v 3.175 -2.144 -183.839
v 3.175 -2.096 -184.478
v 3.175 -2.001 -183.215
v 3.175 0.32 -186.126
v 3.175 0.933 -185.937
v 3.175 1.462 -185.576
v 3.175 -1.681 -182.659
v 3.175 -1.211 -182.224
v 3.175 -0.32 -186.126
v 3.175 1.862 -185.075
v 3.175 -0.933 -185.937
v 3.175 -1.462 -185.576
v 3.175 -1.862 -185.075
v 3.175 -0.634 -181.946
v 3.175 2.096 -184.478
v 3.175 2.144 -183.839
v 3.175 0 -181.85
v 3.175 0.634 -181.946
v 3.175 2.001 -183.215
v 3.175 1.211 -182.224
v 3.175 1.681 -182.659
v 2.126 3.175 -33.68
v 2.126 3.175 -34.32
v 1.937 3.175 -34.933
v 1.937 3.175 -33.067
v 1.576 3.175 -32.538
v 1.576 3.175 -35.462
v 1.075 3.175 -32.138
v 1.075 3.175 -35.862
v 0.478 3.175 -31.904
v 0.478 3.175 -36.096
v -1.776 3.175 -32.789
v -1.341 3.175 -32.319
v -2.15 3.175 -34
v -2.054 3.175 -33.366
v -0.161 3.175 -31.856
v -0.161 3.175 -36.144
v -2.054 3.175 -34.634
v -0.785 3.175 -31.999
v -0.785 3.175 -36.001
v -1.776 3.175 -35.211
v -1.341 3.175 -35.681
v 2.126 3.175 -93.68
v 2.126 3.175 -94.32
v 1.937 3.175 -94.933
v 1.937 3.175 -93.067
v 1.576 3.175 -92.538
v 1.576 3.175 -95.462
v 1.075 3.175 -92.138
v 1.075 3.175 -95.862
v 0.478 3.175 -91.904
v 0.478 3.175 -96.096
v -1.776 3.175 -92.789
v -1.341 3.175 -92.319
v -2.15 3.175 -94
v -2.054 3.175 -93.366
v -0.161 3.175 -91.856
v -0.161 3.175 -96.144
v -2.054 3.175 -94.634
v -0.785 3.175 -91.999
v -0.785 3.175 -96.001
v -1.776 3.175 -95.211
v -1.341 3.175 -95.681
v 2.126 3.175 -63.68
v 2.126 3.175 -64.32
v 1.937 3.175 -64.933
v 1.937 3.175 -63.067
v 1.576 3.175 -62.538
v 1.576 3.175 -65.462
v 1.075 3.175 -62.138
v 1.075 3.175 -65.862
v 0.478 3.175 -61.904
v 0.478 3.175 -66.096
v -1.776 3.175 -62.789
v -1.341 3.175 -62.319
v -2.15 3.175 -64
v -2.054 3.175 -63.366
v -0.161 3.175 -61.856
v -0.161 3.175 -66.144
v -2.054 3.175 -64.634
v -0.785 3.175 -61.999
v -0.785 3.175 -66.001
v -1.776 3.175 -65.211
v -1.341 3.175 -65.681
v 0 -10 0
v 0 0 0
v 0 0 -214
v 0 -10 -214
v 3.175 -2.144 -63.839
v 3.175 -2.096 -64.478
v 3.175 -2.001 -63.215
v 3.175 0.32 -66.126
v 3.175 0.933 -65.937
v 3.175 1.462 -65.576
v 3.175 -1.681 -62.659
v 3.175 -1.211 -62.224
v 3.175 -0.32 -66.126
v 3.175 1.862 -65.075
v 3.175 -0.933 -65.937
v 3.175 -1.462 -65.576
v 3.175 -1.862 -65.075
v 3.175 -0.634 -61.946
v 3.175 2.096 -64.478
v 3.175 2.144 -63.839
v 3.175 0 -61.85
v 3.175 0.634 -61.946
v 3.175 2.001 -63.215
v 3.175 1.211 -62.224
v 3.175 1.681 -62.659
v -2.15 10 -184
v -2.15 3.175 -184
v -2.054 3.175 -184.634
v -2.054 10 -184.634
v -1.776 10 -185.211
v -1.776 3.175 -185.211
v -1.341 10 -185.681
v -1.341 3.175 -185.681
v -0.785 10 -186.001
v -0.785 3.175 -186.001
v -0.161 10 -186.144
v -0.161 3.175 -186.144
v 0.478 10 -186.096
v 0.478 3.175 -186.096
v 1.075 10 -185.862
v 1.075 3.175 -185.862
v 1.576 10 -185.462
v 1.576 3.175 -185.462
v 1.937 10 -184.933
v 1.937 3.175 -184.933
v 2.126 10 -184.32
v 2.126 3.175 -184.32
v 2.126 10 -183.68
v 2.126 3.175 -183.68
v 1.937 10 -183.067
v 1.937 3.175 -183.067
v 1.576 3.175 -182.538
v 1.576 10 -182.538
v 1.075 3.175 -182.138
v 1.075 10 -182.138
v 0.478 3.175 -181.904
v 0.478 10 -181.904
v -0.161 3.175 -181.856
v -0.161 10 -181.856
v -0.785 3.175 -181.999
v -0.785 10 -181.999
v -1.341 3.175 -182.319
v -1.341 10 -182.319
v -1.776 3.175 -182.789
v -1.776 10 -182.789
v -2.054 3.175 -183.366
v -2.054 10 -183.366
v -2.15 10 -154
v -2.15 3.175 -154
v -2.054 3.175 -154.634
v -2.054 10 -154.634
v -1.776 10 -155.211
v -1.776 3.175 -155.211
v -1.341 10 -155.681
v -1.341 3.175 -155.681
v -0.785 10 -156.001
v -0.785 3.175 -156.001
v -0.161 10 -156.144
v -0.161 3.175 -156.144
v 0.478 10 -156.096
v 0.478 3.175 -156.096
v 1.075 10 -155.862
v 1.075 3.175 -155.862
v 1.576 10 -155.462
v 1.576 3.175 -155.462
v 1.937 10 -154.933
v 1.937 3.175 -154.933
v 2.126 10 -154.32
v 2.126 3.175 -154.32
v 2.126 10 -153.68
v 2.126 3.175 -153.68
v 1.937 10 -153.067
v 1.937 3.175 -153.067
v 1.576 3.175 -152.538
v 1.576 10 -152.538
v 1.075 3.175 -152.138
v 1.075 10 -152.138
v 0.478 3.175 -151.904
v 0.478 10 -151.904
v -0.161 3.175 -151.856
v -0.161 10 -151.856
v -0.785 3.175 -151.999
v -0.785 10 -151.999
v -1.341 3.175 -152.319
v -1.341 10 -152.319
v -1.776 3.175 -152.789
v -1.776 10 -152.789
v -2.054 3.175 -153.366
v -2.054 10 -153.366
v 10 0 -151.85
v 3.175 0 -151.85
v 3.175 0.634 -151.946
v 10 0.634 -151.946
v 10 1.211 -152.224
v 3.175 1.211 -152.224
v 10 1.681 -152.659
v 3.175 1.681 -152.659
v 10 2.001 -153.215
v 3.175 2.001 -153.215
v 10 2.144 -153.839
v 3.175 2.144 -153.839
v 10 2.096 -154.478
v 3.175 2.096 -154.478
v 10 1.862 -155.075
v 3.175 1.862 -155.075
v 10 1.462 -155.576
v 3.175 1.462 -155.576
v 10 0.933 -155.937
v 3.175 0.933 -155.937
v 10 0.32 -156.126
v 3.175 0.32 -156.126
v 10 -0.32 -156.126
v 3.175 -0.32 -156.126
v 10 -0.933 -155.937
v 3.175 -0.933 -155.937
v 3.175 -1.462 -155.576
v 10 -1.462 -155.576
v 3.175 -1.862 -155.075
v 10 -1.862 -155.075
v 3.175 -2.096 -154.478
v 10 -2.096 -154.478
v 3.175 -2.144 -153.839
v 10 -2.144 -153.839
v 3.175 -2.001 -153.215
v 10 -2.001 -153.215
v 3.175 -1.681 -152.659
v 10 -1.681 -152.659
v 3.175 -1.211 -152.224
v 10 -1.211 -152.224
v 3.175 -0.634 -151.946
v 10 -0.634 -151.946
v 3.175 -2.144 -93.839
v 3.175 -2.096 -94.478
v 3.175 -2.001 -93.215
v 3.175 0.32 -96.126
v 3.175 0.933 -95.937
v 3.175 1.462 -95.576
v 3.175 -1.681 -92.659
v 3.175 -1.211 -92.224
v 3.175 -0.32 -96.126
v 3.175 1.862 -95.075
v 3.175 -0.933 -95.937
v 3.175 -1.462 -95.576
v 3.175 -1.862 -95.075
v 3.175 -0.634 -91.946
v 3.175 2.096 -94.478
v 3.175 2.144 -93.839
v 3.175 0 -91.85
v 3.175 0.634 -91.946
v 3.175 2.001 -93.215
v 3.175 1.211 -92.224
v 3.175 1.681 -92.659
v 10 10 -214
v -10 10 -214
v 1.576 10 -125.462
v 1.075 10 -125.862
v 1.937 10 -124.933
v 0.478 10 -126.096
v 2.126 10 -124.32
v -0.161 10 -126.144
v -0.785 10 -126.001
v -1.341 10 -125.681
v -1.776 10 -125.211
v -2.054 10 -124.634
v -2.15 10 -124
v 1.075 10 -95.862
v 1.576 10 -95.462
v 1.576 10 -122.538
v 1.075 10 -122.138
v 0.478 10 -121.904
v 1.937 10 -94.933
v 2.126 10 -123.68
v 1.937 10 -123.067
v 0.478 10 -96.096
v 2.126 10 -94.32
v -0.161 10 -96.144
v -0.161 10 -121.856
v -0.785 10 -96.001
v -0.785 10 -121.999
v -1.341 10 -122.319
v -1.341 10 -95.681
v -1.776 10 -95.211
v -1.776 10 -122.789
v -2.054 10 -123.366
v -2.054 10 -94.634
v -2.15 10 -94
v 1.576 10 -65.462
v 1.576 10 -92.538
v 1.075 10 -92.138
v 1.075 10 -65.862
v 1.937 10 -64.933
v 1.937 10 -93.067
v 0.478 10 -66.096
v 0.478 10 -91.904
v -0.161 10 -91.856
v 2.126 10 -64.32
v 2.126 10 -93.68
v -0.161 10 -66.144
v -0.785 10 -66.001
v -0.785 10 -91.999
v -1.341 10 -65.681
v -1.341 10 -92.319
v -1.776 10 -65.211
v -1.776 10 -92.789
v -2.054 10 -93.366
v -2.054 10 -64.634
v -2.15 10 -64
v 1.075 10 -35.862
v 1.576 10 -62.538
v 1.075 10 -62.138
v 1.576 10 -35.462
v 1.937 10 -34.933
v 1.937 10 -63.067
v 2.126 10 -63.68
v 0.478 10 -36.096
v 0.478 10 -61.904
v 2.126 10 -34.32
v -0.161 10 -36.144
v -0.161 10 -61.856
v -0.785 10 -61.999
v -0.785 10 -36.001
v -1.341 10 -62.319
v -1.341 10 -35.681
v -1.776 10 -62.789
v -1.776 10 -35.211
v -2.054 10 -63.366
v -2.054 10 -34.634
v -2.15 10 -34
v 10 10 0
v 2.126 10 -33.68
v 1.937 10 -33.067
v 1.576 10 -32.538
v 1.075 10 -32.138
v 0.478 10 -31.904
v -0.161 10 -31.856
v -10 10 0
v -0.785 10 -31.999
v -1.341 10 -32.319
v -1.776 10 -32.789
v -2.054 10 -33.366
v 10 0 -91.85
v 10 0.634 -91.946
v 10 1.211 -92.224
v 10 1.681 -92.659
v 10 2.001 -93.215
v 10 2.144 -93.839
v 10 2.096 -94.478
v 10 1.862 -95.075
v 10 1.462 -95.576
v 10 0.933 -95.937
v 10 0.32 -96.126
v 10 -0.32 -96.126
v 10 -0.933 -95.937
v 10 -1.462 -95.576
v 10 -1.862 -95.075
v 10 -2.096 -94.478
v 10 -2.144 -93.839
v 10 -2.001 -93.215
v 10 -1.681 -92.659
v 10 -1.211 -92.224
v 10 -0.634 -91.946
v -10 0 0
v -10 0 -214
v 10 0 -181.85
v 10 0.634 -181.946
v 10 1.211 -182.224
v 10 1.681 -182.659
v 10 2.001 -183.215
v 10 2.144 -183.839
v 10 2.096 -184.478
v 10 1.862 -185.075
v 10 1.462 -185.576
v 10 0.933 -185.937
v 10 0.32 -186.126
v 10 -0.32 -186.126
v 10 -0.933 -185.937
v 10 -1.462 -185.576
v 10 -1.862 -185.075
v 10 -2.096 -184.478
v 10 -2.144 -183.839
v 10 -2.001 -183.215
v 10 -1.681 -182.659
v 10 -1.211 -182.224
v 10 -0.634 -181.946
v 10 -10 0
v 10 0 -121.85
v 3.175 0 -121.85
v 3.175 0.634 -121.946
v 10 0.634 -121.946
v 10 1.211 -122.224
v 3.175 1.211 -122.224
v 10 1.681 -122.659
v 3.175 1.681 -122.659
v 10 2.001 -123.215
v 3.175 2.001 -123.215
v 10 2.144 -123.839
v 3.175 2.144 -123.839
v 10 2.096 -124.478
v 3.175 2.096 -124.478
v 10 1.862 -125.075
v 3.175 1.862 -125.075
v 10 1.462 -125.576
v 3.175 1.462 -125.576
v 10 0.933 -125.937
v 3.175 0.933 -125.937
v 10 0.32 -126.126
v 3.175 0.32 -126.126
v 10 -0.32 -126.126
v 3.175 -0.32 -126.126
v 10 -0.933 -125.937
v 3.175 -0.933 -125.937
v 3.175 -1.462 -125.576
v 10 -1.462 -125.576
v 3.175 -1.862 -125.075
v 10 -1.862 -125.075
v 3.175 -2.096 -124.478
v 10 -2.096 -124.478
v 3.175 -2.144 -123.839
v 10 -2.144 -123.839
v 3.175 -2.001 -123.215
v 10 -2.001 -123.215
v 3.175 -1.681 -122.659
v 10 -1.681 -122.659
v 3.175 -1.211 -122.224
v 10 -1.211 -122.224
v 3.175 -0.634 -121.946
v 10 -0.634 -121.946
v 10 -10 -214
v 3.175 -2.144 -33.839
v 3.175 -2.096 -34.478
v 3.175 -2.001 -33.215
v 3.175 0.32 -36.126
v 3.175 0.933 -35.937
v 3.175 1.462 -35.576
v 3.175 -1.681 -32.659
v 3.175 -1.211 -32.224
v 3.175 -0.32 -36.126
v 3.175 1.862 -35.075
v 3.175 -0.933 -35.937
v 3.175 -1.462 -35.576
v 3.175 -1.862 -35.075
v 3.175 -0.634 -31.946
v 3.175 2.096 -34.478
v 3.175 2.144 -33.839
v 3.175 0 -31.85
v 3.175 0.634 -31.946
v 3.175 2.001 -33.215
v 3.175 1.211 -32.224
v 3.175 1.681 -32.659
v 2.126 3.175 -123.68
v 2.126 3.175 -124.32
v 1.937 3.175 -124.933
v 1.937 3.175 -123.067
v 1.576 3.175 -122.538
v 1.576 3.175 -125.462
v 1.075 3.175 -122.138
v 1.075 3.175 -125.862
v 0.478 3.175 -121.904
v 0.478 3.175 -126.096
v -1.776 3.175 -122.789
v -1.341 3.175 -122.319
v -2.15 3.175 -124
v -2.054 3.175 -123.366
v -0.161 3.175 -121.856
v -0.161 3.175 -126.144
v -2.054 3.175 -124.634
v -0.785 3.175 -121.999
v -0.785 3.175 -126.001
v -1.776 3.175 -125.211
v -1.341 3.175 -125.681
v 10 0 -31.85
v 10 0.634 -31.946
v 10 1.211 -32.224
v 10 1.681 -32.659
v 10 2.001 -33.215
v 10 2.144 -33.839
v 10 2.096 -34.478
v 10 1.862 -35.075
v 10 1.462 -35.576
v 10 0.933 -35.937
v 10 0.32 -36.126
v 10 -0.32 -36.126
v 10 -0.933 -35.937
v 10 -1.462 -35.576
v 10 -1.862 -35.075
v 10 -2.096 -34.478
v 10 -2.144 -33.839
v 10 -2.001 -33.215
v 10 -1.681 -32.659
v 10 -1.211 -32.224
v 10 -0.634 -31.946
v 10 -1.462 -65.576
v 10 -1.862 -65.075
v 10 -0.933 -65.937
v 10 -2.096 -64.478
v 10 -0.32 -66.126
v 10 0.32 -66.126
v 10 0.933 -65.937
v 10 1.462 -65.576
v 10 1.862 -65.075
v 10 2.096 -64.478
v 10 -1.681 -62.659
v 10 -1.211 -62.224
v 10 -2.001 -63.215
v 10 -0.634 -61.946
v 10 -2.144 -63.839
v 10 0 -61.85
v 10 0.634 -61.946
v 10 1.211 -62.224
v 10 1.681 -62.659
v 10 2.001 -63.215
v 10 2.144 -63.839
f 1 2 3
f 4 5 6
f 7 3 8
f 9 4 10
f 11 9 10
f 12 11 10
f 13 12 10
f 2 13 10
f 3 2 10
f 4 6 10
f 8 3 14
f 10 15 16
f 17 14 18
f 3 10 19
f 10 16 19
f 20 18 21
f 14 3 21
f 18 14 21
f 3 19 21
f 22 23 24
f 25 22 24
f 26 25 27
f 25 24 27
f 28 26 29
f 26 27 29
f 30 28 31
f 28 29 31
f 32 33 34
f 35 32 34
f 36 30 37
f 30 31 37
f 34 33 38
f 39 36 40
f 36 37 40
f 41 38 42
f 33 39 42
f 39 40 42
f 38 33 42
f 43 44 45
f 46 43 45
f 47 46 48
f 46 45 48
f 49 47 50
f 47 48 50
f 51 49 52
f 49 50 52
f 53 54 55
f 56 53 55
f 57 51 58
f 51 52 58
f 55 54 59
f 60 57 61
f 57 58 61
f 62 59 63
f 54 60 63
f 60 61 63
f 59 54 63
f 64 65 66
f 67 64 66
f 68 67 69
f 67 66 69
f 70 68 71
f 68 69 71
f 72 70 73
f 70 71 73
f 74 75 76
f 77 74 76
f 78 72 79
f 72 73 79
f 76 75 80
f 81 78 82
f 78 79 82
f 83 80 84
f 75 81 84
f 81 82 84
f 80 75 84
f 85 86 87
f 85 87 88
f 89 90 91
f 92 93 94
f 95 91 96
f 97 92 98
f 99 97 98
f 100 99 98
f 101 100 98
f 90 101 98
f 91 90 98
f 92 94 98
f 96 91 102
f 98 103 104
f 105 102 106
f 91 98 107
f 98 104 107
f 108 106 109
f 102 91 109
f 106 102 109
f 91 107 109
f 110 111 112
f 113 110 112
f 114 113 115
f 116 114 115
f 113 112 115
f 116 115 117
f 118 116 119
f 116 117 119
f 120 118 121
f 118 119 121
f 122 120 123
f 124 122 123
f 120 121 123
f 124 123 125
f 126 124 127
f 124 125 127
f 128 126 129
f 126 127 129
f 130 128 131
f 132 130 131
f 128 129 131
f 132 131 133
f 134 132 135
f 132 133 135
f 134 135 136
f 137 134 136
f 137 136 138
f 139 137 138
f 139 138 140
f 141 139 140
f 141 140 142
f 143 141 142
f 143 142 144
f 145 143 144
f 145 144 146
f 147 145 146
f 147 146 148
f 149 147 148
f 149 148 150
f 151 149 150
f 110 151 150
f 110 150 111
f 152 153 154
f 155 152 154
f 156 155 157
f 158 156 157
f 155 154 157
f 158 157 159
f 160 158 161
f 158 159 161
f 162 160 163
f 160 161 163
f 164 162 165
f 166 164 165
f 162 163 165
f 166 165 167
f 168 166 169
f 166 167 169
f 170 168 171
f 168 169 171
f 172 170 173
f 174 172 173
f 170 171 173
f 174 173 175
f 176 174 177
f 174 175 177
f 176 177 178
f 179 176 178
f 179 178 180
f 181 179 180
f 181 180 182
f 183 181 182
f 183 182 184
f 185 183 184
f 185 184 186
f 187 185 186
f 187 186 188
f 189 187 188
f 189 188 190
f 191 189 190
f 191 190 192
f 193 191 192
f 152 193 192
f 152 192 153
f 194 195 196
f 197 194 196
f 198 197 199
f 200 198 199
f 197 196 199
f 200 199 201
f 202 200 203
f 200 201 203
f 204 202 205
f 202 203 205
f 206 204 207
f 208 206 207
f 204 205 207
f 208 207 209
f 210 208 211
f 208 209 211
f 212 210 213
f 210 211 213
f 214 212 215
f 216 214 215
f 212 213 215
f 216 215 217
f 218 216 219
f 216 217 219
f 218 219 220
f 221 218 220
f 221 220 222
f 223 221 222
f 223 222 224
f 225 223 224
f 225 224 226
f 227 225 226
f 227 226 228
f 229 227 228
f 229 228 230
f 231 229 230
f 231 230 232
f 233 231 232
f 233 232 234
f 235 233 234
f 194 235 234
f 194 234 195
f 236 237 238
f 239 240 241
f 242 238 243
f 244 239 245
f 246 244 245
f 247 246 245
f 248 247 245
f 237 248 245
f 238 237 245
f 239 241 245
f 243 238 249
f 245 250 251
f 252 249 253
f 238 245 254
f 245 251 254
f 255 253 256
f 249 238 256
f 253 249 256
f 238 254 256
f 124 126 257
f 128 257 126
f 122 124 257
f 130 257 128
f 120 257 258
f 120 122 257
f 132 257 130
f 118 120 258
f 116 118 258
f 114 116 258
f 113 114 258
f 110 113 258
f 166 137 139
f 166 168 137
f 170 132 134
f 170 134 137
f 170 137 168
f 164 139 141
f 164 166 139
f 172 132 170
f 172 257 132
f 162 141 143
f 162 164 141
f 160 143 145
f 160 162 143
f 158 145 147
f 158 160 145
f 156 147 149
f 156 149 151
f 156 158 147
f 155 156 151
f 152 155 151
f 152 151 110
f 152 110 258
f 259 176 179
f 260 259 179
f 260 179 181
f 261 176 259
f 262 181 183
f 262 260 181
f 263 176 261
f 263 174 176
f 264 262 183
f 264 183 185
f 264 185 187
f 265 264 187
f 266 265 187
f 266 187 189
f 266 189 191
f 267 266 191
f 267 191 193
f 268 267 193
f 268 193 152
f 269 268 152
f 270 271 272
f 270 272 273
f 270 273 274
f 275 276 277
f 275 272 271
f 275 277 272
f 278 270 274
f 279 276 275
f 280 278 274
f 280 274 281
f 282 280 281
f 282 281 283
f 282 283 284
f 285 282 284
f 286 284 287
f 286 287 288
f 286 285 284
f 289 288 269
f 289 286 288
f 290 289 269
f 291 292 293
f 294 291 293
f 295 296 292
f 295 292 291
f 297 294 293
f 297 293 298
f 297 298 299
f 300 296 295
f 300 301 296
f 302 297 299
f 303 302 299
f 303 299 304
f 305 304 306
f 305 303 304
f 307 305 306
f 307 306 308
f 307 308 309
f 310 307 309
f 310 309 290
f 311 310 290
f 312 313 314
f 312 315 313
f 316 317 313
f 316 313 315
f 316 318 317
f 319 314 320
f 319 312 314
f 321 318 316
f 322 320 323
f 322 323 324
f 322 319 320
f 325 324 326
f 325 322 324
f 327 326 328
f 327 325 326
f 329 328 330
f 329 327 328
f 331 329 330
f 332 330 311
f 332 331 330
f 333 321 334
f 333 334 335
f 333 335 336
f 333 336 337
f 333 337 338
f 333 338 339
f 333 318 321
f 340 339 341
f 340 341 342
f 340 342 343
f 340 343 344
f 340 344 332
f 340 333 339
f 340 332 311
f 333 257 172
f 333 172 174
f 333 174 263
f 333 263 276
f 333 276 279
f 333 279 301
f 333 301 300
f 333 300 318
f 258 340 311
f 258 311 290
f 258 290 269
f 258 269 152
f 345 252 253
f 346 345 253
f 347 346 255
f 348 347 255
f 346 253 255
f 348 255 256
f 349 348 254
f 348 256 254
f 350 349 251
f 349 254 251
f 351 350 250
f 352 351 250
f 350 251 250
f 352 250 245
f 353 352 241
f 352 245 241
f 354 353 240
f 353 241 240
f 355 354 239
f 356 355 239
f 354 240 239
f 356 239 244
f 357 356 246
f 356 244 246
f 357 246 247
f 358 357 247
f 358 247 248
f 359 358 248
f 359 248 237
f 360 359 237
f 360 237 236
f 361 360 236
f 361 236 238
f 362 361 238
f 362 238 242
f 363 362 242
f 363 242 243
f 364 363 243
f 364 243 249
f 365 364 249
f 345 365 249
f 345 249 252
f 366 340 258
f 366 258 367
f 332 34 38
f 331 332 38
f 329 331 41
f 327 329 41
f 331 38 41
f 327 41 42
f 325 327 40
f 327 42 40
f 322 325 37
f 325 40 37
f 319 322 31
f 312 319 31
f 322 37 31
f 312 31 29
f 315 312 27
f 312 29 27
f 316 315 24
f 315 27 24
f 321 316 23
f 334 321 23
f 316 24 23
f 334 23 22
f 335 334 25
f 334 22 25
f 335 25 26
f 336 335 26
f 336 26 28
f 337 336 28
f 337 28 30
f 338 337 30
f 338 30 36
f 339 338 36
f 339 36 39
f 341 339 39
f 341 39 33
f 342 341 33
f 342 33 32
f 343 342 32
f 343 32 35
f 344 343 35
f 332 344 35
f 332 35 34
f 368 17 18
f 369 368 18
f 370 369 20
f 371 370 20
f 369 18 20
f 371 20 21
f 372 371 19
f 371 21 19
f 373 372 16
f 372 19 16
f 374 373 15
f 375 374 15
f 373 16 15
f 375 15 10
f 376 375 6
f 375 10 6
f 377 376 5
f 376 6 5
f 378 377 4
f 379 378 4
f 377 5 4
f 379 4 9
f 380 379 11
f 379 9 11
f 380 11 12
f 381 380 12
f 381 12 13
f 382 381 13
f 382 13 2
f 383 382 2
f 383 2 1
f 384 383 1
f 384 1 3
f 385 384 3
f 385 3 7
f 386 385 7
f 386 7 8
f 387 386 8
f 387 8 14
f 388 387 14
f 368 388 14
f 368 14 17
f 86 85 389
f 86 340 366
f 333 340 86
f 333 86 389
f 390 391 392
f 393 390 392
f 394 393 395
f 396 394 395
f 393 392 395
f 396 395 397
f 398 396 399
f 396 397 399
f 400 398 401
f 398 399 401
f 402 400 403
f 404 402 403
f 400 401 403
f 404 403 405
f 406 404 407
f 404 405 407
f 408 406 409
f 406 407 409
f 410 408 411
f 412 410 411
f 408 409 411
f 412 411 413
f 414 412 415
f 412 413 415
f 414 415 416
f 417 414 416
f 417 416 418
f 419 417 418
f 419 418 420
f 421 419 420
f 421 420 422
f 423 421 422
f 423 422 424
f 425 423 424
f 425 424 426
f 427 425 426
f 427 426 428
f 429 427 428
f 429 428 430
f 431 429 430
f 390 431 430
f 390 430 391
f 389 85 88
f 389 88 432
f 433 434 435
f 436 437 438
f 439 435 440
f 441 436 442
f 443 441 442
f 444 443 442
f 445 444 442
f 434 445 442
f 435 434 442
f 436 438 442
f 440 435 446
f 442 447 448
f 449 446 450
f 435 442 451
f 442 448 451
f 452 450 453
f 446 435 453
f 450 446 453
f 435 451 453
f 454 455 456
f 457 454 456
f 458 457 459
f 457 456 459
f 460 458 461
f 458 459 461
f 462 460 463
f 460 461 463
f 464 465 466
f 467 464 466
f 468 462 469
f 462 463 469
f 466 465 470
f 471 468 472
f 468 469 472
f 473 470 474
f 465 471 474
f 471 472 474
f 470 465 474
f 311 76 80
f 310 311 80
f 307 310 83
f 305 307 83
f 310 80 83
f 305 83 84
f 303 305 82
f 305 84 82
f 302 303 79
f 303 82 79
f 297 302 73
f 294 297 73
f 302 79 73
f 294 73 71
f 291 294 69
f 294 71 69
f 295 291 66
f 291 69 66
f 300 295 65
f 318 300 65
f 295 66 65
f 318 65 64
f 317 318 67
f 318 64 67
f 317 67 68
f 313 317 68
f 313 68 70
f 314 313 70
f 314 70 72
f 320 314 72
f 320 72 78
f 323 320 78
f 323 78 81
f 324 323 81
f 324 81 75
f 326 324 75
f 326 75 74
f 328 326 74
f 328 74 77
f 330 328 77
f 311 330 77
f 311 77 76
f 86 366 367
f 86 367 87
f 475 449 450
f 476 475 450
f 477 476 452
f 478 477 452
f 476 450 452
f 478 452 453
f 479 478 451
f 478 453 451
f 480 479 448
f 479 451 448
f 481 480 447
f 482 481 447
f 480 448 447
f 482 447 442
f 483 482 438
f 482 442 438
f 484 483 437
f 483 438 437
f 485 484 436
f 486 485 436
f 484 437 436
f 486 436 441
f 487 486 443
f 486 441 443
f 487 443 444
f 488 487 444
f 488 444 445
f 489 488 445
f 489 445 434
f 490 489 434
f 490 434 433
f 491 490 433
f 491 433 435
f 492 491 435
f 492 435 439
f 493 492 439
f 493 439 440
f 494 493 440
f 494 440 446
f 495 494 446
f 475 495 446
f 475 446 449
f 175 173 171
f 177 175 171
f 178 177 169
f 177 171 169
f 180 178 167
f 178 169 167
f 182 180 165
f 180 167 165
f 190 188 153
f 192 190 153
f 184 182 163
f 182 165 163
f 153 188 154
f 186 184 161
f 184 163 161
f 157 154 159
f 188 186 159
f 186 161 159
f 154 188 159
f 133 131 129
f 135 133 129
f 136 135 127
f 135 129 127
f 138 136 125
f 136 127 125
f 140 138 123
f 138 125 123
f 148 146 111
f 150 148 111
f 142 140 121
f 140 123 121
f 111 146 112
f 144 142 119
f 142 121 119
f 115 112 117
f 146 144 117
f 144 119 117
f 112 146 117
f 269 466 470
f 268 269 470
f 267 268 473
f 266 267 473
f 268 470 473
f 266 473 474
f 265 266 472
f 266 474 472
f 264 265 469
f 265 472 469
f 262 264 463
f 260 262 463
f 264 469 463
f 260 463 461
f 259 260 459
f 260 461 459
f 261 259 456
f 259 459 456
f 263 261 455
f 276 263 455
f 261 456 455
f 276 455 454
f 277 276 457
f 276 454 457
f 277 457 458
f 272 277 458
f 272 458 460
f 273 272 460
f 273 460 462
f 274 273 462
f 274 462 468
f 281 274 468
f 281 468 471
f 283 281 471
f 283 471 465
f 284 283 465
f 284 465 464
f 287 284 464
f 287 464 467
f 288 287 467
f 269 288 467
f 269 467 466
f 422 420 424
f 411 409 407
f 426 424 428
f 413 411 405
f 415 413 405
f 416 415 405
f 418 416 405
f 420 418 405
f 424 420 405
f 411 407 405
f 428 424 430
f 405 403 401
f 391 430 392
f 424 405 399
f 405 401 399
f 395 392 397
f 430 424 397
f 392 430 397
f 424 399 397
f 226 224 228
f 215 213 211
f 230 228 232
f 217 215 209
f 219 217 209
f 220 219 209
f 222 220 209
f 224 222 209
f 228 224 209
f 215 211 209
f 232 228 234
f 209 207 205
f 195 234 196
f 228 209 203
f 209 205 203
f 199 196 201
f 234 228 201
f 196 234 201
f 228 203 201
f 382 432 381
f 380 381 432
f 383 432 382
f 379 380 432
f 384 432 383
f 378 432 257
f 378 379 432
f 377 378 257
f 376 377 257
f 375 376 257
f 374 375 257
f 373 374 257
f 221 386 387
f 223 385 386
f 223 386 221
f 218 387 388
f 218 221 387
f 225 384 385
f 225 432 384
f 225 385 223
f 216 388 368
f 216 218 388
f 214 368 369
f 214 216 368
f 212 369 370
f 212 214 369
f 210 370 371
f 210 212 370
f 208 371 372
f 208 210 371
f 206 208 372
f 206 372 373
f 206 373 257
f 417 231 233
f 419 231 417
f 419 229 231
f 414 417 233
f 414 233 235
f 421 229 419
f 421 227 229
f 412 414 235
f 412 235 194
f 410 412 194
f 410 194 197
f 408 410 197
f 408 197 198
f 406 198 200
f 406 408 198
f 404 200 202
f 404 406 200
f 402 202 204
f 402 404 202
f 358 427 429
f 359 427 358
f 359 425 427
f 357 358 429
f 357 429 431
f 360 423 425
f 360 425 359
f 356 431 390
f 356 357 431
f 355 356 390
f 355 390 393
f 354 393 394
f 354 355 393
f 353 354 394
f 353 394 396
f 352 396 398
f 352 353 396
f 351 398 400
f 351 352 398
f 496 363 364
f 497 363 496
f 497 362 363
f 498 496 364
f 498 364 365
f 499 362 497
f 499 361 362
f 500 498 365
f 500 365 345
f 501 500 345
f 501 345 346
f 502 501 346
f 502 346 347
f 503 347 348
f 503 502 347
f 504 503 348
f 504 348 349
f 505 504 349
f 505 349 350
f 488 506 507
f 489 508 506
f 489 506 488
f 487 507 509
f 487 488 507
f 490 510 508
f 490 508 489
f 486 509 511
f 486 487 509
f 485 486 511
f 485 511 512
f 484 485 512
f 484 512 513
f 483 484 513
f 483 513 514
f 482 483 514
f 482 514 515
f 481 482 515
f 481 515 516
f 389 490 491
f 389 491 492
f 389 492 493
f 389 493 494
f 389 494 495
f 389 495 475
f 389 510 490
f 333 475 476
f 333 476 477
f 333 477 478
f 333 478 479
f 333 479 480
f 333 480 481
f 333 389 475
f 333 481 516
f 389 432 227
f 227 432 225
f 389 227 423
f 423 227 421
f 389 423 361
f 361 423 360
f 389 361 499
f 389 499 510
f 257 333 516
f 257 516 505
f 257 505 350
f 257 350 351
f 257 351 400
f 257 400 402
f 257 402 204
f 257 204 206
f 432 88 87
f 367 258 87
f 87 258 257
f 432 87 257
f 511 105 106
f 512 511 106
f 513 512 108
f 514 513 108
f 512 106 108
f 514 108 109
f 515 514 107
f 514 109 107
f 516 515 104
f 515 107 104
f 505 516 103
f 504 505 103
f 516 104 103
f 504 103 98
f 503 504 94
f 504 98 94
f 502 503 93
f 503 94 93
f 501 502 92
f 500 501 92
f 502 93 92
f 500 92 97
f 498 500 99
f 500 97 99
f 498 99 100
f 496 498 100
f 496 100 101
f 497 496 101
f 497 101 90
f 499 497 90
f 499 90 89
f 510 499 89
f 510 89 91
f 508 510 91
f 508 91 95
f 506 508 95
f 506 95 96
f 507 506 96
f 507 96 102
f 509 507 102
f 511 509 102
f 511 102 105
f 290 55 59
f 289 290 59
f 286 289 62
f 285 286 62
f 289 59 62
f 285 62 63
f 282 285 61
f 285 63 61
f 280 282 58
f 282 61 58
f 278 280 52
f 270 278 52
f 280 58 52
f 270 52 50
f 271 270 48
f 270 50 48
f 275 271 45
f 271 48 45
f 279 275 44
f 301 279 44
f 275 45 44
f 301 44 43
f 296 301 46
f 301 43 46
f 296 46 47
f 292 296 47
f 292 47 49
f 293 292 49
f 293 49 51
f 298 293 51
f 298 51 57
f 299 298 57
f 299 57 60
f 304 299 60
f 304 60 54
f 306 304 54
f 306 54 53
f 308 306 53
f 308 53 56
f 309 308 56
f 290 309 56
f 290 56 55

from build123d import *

# Parameters (mm, degrees)
BOSS_EXTRUDE1_DEPTH             = 214
TAP_DRILL_FOR_M3X0_5_TAP1_D     = 4.3
TAP_DRILL_FOR_M3X0_5_TAP1_DEPTH = 6.825
TAP_DRILL_FOR_M3X0_5_TAP2_D     = 4.3
TAP_DRILL_FOR_M3X0_5_TAP2_DEPTH = 6.825


with BuildPart() as part:
    # Sketch1 → Boss-Extrude1 (new body)
    with BuildSketch(Plane.XY):
        Polygon((0, -10), (10, -10), (10, 10), (-10, 10), (-10, 0), (0, 0), align=None)
    extrude(amount=-BOSS_EXTRUDE1_DEPTH)

    # Tap Drill for M3x0.5 Tap1
    with Locations(Plane(origin=(10, 0, 0), x_dir=(0, 0, -1), z_dir=(1, 0, 0))):
        with Locations((34, 0), (64, 0), (94, 0), (124, 0), (154, 0), (184, 0)):
            Hole(TAP_DRILL_FOR_M3X0_5_TAP1_D / 2, depth=TAP_DRILL_FOR_M3X0_5_TAP1_DEPTH)

    # Tap Drill for M3x0.5 Tap2
    with Locations(Plane(origin=(0, 10, 0), x_dir=(1, 0, 0), z_dir=(0, 1, 0))):
        with Locations((0, 34), (0, 64), (0, 94), (0, 124), (0, 154), (0, 184)):
            Hole(TAP_DRILL_FOR_M3X0_5_TAP2_D / 2, depth=TAP_DRILL_FOR_M3X0_5_TAP2_DEPTH)


solid = part.part
